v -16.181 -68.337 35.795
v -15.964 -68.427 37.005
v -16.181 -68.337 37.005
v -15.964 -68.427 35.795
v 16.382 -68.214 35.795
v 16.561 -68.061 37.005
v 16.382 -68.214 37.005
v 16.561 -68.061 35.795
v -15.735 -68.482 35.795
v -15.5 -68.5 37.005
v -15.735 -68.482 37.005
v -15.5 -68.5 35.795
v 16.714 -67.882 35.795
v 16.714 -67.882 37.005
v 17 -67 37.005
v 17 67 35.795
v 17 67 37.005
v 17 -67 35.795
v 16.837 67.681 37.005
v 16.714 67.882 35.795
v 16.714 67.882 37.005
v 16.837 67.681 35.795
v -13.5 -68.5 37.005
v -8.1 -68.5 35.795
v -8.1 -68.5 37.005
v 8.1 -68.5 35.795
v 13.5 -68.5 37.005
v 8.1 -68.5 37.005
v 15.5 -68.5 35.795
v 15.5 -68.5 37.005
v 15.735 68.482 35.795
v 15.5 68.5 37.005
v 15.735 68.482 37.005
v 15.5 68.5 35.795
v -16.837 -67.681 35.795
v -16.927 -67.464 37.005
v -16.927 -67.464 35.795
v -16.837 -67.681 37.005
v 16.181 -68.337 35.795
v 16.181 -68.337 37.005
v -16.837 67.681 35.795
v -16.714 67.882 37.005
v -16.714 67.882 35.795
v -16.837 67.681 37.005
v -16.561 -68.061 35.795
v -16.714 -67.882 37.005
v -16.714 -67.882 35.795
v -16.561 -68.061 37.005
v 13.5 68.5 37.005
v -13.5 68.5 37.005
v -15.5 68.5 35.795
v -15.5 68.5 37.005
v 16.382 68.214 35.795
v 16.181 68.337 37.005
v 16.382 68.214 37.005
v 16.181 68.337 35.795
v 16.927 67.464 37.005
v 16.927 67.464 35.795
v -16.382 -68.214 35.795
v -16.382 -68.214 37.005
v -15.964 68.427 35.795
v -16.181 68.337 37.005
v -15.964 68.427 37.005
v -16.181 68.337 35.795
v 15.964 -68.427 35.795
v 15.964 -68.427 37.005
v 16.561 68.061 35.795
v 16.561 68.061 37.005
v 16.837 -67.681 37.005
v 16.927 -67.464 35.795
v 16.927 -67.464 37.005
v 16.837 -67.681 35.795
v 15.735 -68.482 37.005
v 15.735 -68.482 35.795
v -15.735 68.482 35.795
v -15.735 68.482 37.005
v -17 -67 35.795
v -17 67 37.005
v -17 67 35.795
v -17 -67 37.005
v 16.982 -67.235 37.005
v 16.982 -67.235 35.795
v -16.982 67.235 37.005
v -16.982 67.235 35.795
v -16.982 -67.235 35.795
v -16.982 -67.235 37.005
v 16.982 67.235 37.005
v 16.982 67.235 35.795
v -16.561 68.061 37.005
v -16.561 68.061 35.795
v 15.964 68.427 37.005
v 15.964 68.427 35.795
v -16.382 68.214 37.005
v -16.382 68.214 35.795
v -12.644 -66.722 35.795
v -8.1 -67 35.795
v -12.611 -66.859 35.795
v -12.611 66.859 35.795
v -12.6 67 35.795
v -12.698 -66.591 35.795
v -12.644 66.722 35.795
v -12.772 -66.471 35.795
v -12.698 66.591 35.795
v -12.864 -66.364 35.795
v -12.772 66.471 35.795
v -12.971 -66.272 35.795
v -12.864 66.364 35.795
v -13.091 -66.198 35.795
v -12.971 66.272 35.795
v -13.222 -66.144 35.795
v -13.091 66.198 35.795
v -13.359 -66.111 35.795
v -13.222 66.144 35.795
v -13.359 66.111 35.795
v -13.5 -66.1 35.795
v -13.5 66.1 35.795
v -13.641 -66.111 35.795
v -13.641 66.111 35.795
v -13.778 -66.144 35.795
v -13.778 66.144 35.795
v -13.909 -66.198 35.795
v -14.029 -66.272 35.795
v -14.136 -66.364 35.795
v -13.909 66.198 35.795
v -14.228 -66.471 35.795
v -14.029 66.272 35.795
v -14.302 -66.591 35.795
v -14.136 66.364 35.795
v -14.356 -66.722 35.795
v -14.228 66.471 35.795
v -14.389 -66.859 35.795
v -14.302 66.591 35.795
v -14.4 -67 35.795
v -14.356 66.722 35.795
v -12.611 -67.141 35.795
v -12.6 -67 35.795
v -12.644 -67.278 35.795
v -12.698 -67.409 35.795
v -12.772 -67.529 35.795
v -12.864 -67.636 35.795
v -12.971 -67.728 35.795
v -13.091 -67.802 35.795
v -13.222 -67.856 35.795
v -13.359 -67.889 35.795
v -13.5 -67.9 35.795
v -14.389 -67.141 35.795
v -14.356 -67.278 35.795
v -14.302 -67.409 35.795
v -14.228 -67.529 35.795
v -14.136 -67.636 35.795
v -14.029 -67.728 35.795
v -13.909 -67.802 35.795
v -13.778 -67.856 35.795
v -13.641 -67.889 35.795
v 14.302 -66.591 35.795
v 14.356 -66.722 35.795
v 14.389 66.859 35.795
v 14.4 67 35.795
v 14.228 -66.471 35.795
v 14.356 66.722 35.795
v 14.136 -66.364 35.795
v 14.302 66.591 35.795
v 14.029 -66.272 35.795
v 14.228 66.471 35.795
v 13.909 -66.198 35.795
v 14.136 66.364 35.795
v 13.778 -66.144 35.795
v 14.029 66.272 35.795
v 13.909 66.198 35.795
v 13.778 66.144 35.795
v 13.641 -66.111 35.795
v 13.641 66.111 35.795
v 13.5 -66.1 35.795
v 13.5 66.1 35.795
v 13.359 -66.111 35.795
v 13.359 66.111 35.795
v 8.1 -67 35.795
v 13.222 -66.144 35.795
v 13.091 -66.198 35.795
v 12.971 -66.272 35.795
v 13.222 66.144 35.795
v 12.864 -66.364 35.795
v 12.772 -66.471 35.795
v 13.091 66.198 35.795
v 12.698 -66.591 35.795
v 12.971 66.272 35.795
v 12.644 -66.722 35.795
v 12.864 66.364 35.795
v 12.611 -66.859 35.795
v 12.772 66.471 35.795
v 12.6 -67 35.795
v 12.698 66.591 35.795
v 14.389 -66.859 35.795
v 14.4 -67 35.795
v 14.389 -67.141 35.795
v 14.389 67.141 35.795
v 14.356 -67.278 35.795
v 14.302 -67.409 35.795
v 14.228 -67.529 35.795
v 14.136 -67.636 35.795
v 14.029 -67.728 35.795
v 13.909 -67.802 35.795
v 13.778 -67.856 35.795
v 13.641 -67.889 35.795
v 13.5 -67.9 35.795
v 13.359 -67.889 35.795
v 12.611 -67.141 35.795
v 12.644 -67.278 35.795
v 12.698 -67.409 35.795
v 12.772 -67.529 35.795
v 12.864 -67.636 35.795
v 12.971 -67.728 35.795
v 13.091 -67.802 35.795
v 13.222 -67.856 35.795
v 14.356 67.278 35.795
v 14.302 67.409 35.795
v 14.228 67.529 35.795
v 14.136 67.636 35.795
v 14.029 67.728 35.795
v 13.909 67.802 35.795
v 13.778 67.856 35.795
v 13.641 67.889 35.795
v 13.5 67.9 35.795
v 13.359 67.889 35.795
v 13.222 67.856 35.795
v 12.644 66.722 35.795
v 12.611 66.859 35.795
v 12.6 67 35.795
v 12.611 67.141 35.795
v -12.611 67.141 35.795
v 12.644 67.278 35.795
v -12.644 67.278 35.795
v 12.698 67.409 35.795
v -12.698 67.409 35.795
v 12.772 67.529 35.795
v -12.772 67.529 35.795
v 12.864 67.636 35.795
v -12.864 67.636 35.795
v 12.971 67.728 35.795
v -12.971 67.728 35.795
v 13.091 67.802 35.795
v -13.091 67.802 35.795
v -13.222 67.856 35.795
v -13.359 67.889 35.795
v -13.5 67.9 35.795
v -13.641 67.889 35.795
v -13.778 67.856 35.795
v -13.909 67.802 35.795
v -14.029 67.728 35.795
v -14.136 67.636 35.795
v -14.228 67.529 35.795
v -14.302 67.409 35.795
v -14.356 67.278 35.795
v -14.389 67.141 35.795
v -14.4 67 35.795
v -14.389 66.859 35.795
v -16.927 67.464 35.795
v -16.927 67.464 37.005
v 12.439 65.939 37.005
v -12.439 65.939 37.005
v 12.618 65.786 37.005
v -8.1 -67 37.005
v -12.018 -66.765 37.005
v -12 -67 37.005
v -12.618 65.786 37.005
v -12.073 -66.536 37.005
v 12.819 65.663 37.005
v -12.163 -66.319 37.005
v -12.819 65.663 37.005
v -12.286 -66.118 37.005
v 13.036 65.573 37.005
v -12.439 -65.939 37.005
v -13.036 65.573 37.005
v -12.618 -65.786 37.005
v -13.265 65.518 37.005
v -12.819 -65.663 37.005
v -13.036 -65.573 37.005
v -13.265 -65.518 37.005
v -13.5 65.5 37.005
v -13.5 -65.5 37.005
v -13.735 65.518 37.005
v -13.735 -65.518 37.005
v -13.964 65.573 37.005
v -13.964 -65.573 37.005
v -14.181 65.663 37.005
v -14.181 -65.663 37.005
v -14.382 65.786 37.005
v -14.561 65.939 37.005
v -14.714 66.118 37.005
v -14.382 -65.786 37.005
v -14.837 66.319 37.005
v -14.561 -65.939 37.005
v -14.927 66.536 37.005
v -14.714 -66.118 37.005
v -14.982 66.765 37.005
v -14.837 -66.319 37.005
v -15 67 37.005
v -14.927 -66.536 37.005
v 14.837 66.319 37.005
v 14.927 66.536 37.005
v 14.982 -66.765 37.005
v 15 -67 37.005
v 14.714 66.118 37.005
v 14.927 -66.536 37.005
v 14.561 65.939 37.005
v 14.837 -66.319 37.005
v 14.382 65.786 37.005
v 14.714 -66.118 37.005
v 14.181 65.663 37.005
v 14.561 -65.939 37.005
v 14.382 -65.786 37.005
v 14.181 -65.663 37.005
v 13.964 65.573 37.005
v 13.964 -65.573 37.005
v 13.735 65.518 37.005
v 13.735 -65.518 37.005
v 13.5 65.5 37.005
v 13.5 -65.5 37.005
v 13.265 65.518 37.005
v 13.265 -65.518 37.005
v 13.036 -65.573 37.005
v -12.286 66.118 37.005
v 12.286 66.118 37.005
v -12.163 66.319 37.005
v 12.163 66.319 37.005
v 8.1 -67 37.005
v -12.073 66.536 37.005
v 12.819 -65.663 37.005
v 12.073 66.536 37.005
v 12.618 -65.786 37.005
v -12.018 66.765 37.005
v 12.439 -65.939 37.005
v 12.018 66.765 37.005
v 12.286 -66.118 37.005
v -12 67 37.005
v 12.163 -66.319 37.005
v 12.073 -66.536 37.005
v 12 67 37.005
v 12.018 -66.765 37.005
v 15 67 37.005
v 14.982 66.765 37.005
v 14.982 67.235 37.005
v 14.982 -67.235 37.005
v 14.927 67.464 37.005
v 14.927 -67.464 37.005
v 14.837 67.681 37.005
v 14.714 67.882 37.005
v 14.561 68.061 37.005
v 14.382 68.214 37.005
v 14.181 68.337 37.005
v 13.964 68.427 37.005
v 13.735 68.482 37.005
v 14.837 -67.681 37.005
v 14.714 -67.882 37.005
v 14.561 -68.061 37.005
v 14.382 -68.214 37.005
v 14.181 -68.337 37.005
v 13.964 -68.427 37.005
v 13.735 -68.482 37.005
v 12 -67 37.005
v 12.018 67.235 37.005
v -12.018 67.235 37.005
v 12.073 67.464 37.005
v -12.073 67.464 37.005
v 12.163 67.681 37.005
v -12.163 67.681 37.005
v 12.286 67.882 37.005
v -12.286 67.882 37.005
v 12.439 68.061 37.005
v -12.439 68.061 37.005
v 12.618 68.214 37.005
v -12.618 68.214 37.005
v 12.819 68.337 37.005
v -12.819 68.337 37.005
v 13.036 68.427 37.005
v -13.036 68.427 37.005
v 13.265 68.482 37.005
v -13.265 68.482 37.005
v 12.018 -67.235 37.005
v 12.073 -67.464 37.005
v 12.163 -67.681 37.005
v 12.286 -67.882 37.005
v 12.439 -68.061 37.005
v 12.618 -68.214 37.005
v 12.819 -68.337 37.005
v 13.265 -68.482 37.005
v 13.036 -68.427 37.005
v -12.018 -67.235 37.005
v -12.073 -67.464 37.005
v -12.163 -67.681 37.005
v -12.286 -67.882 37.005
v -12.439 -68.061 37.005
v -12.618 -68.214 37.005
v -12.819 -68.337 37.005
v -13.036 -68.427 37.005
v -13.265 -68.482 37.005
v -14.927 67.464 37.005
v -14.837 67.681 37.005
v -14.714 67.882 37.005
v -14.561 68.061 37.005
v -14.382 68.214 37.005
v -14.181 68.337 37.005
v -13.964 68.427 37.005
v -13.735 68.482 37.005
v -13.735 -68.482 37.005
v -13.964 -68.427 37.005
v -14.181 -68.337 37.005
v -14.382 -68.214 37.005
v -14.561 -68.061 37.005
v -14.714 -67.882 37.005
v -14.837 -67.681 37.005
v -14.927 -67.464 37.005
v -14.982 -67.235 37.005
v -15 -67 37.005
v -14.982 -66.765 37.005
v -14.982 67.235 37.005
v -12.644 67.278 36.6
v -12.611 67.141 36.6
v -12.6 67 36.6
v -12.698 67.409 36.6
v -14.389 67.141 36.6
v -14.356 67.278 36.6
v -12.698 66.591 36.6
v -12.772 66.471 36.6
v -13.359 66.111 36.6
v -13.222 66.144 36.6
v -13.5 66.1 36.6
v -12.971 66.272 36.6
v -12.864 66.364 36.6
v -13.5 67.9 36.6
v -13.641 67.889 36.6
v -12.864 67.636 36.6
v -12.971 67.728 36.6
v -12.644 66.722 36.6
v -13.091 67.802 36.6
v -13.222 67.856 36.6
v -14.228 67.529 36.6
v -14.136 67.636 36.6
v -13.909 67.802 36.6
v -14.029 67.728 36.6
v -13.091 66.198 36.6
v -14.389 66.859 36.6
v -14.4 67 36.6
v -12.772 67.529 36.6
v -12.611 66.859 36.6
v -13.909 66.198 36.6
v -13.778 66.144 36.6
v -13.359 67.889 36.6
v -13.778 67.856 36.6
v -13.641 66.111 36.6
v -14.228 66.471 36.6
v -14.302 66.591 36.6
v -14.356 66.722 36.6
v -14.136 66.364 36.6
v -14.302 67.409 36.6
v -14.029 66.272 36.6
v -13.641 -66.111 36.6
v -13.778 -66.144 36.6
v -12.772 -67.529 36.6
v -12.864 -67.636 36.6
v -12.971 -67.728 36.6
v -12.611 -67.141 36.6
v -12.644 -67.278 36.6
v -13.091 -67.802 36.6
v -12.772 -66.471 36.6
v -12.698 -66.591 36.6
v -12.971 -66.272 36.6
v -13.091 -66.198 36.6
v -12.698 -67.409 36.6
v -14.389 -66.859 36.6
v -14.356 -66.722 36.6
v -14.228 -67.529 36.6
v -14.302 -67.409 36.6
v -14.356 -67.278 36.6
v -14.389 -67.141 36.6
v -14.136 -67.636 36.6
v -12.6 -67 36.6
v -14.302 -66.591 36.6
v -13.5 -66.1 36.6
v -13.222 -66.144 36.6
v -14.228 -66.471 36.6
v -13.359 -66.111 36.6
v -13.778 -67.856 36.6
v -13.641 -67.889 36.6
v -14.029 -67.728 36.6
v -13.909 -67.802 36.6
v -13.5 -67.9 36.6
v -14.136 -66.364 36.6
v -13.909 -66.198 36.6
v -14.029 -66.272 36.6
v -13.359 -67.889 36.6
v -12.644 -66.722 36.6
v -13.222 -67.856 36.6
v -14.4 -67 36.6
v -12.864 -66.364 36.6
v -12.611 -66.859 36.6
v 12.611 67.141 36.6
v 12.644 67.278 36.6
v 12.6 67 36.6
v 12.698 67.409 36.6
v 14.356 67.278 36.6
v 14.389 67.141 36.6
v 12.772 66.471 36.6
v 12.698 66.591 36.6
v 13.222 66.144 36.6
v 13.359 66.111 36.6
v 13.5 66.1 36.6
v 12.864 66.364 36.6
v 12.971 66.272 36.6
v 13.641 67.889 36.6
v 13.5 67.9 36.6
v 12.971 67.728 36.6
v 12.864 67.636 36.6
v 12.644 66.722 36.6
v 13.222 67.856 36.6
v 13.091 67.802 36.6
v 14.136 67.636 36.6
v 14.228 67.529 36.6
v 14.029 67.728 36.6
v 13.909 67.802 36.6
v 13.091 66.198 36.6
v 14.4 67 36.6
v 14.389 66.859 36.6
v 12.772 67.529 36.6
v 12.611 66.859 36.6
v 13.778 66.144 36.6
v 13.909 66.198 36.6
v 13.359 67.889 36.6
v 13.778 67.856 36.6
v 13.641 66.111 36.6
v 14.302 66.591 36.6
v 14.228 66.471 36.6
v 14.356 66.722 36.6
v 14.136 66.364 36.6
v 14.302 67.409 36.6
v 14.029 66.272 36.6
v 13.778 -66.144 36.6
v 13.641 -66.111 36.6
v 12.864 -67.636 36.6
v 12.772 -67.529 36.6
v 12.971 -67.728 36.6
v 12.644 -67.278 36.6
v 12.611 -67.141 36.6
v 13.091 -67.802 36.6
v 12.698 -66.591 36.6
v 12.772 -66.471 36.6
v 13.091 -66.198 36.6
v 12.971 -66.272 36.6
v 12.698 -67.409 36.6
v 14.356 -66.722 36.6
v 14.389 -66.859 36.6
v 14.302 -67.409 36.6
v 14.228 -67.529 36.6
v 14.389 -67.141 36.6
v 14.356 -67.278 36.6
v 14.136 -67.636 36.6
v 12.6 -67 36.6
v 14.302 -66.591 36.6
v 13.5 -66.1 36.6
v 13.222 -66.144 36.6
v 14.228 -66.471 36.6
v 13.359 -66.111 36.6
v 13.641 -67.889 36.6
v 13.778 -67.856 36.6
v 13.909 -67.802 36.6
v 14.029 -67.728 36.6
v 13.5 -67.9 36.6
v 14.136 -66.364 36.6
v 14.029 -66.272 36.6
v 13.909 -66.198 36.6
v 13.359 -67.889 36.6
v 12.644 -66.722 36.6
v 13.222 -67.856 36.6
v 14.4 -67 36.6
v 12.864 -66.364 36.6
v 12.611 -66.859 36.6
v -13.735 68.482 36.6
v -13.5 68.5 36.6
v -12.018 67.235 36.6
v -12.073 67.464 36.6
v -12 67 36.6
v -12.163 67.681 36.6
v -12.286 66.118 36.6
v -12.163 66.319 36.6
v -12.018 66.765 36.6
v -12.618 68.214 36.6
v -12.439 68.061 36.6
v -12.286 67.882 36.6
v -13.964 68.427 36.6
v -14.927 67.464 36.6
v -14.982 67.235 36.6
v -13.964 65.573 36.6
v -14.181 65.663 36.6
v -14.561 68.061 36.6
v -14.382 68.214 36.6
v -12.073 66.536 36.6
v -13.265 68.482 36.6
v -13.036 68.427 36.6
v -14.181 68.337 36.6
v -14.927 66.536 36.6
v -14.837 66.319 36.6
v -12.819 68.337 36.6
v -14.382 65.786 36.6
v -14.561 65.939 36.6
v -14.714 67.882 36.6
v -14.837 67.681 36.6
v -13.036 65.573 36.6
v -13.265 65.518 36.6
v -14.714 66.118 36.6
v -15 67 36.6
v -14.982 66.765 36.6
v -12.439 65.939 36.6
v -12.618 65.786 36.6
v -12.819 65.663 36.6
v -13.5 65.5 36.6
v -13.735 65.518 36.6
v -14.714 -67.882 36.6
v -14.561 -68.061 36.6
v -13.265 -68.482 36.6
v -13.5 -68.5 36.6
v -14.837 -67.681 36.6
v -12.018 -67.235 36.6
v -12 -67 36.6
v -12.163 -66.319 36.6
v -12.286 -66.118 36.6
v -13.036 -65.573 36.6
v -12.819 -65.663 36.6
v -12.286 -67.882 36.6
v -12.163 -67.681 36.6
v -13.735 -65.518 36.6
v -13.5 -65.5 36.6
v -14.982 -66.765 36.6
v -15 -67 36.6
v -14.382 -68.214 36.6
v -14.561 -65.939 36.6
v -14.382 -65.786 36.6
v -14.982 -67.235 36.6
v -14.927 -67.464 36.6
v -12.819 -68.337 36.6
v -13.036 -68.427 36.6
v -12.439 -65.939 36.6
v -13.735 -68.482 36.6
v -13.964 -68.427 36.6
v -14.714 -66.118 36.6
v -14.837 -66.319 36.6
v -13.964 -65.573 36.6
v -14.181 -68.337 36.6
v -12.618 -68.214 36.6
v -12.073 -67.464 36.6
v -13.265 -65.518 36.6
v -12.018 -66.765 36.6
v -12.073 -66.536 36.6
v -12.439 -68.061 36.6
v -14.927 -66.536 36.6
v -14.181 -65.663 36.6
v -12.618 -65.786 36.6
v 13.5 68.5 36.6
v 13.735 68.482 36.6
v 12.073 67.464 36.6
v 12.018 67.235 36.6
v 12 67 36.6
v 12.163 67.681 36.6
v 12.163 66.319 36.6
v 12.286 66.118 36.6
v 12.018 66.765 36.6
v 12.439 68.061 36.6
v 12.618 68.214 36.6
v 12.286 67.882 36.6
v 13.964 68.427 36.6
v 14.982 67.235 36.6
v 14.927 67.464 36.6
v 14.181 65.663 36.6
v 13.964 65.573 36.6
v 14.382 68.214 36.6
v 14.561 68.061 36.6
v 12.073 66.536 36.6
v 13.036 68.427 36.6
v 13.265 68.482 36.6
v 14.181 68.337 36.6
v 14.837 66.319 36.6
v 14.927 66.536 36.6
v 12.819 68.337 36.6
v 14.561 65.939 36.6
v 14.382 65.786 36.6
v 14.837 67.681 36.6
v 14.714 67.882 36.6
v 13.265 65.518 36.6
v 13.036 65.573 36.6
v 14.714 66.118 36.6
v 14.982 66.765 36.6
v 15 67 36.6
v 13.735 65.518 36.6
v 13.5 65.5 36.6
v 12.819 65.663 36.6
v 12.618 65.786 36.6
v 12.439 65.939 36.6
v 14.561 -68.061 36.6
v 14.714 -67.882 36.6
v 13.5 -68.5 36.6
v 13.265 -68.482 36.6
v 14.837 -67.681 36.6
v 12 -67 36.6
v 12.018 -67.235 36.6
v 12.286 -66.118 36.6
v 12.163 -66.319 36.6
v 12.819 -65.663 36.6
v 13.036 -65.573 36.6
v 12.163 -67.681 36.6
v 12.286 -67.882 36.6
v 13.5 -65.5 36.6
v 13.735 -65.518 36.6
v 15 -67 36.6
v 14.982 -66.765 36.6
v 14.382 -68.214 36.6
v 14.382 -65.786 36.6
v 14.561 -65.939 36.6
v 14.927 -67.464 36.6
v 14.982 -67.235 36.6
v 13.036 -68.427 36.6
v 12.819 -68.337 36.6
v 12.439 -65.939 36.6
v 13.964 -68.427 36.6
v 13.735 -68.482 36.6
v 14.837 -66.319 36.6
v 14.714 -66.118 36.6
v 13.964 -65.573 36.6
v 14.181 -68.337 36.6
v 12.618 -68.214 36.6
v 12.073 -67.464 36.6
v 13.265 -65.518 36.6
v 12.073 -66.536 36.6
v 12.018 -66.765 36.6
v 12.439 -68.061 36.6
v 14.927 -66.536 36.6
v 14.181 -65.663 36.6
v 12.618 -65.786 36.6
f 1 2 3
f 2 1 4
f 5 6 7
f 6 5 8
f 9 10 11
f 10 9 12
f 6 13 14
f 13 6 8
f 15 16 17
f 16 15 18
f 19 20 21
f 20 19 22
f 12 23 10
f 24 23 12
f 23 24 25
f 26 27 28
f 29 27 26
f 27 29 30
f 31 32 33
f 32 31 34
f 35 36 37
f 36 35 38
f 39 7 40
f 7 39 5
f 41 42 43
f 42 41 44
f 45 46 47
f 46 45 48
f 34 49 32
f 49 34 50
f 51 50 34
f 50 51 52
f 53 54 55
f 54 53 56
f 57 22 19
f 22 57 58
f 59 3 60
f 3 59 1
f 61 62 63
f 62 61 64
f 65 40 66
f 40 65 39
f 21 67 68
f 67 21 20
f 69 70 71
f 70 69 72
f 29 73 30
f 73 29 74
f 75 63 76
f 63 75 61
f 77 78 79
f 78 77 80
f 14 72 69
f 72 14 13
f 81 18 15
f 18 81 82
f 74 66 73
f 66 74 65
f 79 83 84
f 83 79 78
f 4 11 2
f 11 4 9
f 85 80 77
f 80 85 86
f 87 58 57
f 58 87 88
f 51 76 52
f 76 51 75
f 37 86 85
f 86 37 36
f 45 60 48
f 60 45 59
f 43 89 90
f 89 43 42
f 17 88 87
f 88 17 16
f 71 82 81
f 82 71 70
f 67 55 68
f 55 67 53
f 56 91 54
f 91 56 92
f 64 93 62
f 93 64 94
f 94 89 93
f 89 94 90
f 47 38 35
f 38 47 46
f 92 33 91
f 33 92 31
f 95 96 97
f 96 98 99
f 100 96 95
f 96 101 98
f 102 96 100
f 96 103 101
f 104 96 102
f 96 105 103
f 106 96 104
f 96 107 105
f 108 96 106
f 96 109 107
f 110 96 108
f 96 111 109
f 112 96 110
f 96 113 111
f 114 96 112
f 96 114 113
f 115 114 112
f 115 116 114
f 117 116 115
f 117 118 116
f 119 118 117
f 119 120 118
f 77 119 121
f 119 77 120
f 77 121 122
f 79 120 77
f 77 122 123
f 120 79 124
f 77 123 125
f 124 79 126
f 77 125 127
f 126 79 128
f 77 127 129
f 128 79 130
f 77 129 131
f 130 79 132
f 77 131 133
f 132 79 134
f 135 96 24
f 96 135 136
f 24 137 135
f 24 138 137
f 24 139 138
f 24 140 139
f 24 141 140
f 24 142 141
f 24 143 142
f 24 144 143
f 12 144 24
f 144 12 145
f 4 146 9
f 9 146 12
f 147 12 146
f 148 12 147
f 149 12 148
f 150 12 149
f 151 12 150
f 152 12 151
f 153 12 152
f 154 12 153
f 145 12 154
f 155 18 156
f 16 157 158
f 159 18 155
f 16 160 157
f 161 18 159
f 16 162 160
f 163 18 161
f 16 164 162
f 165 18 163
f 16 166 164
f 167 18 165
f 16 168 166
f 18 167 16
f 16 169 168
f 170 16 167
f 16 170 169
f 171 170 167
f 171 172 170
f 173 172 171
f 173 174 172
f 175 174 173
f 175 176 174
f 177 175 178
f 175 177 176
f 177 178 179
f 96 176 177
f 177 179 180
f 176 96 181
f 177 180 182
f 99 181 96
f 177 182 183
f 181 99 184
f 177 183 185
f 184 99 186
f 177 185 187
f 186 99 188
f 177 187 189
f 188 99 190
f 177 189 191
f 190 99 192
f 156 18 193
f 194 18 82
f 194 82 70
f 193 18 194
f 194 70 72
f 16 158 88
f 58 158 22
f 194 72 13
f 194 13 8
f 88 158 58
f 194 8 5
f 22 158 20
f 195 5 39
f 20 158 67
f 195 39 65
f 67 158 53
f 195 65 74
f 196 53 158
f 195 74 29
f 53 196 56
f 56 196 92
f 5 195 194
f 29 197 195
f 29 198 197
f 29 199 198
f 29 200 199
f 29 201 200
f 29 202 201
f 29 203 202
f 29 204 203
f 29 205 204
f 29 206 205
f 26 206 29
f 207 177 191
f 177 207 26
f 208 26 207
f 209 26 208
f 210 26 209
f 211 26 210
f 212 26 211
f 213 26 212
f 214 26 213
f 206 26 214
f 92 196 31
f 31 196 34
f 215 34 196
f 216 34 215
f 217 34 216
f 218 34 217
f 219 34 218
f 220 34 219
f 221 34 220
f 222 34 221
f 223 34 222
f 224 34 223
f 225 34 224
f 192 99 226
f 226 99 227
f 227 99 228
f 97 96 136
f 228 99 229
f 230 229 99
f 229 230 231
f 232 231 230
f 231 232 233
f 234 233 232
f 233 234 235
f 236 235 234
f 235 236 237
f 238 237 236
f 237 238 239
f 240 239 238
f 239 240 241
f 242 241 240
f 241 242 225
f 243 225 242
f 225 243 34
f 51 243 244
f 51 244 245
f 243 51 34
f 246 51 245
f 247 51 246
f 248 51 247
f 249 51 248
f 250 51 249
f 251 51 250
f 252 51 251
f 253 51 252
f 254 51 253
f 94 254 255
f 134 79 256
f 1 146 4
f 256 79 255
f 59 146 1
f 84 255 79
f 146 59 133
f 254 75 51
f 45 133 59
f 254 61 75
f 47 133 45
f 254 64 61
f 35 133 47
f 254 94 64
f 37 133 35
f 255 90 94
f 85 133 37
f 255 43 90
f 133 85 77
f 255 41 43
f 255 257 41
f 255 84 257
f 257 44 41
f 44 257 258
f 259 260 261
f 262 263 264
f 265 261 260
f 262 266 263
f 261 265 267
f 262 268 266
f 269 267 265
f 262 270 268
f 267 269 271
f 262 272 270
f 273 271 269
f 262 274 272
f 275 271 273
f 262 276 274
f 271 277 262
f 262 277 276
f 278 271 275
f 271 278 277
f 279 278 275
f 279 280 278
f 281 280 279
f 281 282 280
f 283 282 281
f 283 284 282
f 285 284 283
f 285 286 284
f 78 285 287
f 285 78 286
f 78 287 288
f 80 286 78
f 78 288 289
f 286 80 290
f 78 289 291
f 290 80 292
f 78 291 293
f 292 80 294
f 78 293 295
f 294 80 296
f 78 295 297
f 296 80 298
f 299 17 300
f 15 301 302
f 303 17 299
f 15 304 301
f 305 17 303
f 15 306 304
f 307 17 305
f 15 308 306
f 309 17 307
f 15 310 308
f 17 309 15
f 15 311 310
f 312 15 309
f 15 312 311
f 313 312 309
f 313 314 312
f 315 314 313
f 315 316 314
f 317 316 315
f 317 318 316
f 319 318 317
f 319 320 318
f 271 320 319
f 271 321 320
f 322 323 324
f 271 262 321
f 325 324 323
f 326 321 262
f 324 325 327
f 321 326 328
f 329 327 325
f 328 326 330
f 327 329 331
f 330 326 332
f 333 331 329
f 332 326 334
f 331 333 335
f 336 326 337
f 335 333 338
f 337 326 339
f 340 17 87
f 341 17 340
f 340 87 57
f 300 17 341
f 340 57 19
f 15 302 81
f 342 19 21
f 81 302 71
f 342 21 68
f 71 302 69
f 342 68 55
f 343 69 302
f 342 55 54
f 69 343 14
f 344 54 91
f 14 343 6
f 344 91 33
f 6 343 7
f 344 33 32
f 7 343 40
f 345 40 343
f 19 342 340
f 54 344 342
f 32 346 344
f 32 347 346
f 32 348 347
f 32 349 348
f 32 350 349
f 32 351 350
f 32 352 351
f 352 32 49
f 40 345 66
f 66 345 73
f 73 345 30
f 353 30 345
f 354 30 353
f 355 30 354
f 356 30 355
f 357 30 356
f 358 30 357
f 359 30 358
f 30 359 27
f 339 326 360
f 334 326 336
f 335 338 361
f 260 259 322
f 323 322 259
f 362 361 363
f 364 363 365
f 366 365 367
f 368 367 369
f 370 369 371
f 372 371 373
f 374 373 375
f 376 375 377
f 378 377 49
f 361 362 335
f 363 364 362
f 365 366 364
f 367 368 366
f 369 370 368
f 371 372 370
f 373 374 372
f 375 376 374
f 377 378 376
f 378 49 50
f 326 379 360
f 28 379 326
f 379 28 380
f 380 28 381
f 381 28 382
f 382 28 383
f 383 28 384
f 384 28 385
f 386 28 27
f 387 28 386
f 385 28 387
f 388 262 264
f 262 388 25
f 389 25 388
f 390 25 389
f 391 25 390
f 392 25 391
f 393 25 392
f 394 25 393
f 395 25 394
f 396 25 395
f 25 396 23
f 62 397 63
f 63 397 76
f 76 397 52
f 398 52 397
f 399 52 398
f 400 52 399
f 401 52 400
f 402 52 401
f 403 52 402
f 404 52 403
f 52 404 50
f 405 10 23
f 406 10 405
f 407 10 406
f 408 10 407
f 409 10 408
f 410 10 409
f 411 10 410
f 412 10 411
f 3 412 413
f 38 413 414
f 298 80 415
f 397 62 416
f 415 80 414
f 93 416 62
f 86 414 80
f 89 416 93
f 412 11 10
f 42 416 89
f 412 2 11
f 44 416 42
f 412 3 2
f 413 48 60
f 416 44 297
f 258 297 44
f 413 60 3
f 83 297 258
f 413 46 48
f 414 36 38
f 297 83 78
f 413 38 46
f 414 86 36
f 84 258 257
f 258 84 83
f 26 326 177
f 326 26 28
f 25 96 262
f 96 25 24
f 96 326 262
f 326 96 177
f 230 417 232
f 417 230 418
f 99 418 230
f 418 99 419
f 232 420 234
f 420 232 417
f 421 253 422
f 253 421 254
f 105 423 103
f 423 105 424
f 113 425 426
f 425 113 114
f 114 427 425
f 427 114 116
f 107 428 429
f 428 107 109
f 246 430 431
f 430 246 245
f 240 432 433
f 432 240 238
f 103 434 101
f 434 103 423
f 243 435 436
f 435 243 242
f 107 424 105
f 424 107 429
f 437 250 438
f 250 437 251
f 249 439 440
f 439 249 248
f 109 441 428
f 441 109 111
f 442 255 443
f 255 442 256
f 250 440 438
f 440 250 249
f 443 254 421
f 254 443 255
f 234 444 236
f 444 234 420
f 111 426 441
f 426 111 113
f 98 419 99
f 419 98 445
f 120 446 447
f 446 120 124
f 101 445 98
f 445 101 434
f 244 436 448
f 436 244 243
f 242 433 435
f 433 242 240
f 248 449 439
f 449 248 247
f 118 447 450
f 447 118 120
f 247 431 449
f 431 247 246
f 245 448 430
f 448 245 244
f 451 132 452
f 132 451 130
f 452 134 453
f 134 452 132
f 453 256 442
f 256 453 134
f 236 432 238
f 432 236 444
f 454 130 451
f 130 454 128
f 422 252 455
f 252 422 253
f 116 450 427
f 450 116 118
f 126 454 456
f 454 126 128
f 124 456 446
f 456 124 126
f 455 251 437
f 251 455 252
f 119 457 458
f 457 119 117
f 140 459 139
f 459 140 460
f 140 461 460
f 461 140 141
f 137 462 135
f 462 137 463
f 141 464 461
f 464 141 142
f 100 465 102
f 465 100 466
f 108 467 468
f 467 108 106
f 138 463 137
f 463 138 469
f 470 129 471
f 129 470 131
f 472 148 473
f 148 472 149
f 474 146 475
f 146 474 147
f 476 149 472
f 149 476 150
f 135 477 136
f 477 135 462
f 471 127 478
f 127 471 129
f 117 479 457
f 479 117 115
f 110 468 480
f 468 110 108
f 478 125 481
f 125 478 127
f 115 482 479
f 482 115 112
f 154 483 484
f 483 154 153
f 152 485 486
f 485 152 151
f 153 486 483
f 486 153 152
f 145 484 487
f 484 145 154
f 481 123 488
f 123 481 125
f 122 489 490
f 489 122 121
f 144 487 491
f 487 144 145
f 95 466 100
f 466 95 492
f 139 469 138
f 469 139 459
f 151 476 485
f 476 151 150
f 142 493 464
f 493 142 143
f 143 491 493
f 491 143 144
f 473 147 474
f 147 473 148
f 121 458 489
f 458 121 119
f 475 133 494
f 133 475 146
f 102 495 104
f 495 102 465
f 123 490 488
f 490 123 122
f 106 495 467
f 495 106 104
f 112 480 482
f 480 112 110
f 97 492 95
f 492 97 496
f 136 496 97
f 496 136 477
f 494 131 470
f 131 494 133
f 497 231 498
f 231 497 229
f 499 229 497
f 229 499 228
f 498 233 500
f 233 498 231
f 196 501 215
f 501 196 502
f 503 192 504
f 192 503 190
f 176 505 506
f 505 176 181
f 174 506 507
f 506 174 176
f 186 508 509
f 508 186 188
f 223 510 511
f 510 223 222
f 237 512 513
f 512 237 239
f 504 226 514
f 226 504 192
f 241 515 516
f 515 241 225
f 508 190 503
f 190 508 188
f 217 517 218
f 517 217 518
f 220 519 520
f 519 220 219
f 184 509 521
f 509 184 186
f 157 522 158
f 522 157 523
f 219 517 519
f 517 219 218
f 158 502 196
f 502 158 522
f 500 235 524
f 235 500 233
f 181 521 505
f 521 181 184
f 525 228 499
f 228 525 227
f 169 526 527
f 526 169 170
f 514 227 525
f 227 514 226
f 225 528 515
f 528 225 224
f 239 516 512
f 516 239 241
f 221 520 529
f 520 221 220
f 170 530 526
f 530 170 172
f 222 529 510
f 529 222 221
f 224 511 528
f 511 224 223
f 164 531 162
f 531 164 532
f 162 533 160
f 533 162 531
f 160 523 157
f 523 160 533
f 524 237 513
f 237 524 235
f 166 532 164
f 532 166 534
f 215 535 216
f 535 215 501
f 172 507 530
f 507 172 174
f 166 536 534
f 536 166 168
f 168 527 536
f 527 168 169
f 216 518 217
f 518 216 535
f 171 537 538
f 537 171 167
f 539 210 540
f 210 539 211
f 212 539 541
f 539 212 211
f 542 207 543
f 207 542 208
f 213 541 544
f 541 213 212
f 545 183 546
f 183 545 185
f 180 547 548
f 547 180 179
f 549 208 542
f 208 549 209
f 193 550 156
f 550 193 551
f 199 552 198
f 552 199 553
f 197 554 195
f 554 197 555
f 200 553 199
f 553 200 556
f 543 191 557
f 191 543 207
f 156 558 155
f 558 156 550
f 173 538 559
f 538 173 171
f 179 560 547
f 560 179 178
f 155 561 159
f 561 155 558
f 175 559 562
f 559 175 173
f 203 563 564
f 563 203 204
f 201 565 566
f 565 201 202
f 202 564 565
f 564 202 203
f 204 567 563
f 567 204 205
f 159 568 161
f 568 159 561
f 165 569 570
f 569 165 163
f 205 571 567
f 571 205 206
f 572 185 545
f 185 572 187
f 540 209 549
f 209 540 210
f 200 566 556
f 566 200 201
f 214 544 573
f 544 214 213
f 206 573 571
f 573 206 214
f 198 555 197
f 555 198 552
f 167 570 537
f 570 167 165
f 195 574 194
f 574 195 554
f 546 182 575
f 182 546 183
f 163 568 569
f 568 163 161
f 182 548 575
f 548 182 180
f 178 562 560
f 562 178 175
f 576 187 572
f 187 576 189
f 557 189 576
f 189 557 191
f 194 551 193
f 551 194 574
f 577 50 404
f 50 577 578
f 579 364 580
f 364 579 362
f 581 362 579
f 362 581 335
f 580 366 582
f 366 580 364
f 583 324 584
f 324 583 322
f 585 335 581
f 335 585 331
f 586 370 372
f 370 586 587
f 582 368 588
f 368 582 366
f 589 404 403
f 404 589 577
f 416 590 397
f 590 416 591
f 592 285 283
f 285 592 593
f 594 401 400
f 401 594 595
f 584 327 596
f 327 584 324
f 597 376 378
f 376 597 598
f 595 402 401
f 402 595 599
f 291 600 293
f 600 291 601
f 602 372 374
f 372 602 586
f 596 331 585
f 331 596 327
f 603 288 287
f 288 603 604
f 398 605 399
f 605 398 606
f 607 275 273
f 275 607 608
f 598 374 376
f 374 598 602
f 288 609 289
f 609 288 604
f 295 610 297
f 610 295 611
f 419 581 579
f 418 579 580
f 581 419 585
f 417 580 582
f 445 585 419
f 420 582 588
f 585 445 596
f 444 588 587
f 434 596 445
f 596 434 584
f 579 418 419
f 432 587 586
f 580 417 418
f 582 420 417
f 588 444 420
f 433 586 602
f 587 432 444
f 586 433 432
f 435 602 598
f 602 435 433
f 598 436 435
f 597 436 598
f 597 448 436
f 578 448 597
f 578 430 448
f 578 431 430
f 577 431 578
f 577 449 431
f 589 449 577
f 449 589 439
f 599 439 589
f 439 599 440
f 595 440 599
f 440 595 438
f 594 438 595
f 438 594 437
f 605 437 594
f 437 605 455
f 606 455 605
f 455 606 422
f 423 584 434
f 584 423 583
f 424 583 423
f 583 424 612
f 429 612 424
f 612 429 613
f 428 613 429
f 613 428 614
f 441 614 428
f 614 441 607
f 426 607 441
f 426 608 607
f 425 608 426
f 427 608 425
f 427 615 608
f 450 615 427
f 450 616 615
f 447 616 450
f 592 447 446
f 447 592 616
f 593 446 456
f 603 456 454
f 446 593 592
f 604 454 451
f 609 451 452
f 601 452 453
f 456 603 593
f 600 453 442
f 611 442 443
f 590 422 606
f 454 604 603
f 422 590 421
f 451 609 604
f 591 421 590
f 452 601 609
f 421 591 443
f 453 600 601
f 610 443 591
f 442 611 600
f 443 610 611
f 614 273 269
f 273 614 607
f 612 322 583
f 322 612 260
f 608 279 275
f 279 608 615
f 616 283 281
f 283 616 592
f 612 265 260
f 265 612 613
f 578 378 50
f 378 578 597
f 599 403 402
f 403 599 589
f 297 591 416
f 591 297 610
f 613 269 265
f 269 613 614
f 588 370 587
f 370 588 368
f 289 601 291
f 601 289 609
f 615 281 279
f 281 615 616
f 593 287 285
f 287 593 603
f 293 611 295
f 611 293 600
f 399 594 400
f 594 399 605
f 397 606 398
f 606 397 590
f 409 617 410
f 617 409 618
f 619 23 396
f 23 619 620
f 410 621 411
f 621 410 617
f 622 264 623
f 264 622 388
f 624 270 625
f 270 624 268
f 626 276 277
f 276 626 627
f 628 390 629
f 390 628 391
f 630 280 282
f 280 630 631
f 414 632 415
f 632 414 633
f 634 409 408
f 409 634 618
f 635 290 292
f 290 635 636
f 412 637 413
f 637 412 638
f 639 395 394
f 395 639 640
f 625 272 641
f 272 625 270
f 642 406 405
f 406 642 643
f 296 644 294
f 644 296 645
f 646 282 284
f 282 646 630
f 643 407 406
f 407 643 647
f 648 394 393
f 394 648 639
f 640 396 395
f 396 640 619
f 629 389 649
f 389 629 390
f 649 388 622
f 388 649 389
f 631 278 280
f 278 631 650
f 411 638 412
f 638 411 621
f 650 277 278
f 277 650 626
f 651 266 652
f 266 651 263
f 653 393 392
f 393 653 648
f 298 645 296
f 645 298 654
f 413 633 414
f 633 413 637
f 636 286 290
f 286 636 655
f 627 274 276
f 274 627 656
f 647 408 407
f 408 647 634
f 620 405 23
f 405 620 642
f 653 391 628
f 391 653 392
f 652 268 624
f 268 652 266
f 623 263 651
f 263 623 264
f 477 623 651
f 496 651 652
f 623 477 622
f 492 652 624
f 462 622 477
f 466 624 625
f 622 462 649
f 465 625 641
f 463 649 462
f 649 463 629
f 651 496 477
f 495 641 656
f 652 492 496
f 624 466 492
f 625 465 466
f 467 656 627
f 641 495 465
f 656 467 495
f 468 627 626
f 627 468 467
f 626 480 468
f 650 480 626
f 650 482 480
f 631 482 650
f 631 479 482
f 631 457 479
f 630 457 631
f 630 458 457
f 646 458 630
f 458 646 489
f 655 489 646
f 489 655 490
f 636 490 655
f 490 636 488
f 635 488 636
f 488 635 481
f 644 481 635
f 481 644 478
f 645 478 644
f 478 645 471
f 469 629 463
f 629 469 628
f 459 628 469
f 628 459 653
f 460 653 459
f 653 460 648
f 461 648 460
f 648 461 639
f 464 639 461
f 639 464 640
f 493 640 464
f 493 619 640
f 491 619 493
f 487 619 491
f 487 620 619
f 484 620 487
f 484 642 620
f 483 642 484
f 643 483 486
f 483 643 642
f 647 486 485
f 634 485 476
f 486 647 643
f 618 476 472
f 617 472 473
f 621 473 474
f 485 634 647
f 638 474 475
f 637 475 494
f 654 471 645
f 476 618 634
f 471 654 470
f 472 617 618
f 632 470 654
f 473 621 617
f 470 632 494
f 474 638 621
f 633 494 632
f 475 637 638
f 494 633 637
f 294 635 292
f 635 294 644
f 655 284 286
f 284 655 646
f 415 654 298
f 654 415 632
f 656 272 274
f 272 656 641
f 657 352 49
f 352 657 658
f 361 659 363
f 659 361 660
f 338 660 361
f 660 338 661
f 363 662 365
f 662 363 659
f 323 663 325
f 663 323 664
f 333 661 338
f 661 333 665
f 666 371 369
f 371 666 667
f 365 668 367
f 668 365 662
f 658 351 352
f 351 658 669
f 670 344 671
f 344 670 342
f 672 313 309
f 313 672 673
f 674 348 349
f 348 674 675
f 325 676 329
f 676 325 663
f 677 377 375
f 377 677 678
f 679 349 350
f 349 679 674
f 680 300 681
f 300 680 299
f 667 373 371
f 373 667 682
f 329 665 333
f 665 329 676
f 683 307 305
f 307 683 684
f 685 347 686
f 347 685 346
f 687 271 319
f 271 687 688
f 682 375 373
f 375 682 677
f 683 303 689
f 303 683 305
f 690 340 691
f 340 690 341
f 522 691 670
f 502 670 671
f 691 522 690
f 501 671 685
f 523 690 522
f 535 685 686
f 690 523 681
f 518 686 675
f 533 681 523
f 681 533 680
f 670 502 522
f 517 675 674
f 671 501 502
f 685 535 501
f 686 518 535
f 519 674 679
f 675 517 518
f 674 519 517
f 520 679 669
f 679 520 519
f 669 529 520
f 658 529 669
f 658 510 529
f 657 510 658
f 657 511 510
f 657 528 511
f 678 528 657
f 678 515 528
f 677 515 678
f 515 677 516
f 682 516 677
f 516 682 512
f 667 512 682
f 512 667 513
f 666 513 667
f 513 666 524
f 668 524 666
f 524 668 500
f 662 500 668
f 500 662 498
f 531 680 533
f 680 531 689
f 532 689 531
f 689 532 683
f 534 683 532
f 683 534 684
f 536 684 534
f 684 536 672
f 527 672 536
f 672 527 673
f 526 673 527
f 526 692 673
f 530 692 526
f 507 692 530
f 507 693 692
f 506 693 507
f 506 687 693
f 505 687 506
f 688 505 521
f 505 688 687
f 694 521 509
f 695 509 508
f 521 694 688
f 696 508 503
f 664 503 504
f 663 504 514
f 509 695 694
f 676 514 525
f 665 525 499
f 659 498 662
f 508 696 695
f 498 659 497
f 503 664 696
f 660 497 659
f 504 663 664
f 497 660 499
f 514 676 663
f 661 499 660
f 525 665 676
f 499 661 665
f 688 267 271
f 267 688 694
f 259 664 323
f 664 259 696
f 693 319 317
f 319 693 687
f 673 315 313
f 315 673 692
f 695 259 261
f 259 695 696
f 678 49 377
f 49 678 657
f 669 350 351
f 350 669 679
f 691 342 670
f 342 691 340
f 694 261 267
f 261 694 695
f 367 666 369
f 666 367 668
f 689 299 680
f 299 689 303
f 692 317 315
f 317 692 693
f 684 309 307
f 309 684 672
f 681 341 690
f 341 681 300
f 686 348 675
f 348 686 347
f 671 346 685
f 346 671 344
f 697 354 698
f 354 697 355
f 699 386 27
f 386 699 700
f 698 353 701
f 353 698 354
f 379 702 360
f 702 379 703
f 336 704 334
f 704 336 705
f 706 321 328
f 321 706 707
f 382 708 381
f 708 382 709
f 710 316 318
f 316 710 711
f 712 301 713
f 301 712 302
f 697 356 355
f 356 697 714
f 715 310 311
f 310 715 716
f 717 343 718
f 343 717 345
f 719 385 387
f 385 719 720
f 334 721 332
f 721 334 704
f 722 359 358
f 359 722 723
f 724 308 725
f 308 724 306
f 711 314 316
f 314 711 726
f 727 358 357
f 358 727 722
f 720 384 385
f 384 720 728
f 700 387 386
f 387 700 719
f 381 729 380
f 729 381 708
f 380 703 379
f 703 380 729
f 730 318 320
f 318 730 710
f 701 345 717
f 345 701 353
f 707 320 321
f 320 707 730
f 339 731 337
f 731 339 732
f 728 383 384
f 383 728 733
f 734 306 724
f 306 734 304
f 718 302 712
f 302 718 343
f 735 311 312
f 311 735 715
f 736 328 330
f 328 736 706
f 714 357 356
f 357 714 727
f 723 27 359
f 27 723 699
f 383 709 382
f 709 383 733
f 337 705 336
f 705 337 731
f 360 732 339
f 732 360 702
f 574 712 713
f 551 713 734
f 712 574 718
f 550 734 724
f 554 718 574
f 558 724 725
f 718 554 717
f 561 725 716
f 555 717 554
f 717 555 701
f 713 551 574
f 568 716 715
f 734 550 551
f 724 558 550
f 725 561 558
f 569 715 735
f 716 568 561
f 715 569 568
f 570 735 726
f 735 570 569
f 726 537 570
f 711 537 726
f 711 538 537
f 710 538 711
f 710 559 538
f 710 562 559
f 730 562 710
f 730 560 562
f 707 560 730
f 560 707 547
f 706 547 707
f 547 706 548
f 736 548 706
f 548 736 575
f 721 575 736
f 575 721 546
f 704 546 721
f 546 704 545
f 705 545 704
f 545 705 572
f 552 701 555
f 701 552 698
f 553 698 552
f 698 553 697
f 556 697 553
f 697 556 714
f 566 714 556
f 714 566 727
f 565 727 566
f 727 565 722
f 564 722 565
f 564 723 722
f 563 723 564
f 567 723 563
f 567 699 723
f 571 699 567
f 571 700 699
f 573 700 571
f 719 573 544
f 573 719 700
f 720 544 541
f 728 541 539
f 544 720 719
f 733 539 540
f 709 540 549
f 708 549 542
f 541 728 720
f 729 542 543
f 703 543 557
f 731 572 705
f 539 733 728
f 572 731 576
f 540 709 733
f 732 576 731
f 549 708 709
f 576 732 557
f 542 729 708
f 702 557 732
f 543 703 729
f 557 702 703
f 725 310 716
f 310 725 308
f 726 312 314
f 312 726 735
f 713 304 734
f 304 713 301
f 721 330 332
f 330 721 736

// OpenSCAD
// file: charging_board_typec.scad
USB_TYPEC_BOARD_X = 17.1;
USB_TYPEC_BOARD_Y = 28.1;
USB_TYPEC_BOARD_Z = 1.0;

module USB_TYPEC_BOARD(diff=false) {
  translate([0, -USB_TYPEC_BOARD_Y/2, 0])   
  linear_extrude(height=USB_TYPEC_BOARD_Z, center=!true, convexity=10, twist=0) 
  square(size=[USB_TYPEC_BOARD_X, USB_TYPEC_BOARD_Y], center=true);

  translate([0, 1.5, USB_TYPEC_BOARD_Z])
  translate([0, -7.3, 3/2])
  rotate([-90, 0, 0]) 
  linear_extrude(height=diff ? 20 : 7.3, center=!true, convexity=10, twist=0)
  hull(){
    offset(r= diff ? 0.3 : 0)
    mirror_x()
    translate([9/2-3/2, 0, 0])
    circle(d=3);
  }
}
// file: scad-utils/mirror.scad
// Copyright (c) 2013 Oskar Linde. All rights reserved.
// License: BSD
//
// This library contains simple mirroring functions
//
// mirror_x()
// mirror_y()
// mirror_z()


module mirror_x() {
  union() {
    child();
    scale([-1,1,1]) child();
  }
}

module mirror_y() {
  union() {
    child();
    scale([1,-1,1]) child();
  }
}

module mirror_z() {
  union() {
    child();
    scale([1,1,-1]) child();
  }
}
// file: scad-utils/morphology.scad
// Copyright (c) 2013 Oskar Linde. All rights reserved.
// License: BSD
//
// This library contains basic 2D morphology operations
//
// outset(d=1)            - creates a polygon at an offset d outside a 2D shape
// inset(d=1)             - creates a polygon at an offset d inside a 2D shape
// fillet(r=1)            - adds fillets of radius r to all concave corners of a 2D shape
// rounding(r=1)          - adds rounding to all convex corners of a 2D shape
// shell(d,center=false)  - makes a shell of width d along the edge of a 2D shape
//                        - positive values of d places the shell on the outside
//                        - negative values of d places the shell on the inside
//                        - center=true and positive d places the shell centered on the edge

module outset(d=1) {
	// Bug workaround for older OpenSCAD versions
	if (version_num() < 20130424) render() outset_extruded(d) children();
	else minkowski() {
		circle(r=d);
		children();
	}
}

module outset_extruded(d=1) {
   projection(cut=true) minkowski() {
        cylinder(r=d);
        linear_extrude(center=true) children();
   }
}

module inset(d=1) {
	 render() inverse() outset(d=d) inverse() children();
}

module fillet(r=1) {
	inset(d=r) render() outset(d=r) children();
}

module rounding(r=1) {
	outset(d=r) inset(d=r) children();
}

module shell(d,center=false) {
	if (center && d > 0) {
		difference() {
			outset(d=d/2) children();
			inset(d=d/2) children();
		}
	}
	if (!center && d > 0) {
		difference() {
			outset(d=d) children();
			children();
		}
	}
	if (!center && d < 0) {
		difference() {
			children();
			inset(d=-d) children();
		}
	}
	if (d == 0) children();
}


// Below are for internal use only

module inverse() {
	difference() {
		square(1e5,center=true);
		children();
	}
}


// TEST CODE

use <mirror.scad>

module arrow(l=1,w=.6,t=0.15) {
	mirror_y() polygon([[0,0],[l,0],[l-w/2,w/2],[l-w/2-sqrt(2)*t,w/2],[l-t/2-sqrt(2)*t,t/2],[0,t/2]]);
}

module shape() {
	polygon([[0,0],[1,0],[1.5,1],[2.5,1],[2,-1],[0,-1]]);
}

if(0) assign($fn=32) {

	for (p = [0:10*3-1]) assign(o=floor(p/3)) {
		translate([(p%3)*2.5,-o*3]) {
			//%if (p % 3 == 1) translate([0,0,1]) shape();
			if (p % 3 == 0) shape();
			if (p % 3 == 1) translate([0.6,0]) arrow();
			if (p % 3 == 2) {
				if (o == 0) inset(d=0.3) shape();
				if (o == 1) outset(d=0.3) shape();
				if (o == 2) rounding(r=0.3) shape();
				if (o == 3) fillet(r=0.3) shape();
				if (o == 4) shell(d=0.3) shape();
				if (o == 5) shell(d=-0.3) shape();
				if (o == 6) shell(d=0.3,center=true) shape();
				if (o == 7) rounding(r=0.3) fillet(r=0.3) shape();
				if (o == 8) shell(d=0.3,center=true) fillet(r=0.3) rounding(r=0.3) shape();
				if (o == 9) shell(d=-0.3) fillet(r=0.3) rounding(r=0.3) shape();
			}
		}
	}
}
// file: minidenko-case-base.scad
$fn=40;

include <scad-utils/morphology.scad>
include <scad-utils/mirror.scad>

// include <charging_board_microb.scad>
include <charging_board_typec.scad>

LED_X=32;
LED_Y=130;
LED_Z=13.0;

BODY_X=LED_X+5;
BODY_Y=LED_Y+10;
// BODY_BOTTOM_Z = 1.4;
BODY_BOTTOM_Z = 0.3;
BODY_Z=LED_Z+11+0.8*2 + BODY_BOTTOM_Z;

STAND_X=3;

BACKPANEL_Z=1.2;

// LED Matrix
*%translate([0, 0, LED_Z/2 + BODY_BOTTOM_Z])
color("red")
cube(size=[LED_X, LED_Y, LED_Z], center=true);

module body(){
  difference(){
    linear_extrude(height=BODY_Z, center=!true, convexity=10, twist=0)
    rounding(r=3)
    square(size=[BODY_X, BODY_Y], center=true);

    // inner space
    translate([0, 0, (BODY_Z)/2 + BODY_BOTTOM_Z]) 
    cube(size=[LED_X + 1, LED_Y + 1, BODY_Z], center=true);

    // edge();
    // USB
    translate([0, LED_Y/2, LED_Z + BODY_BOTTOM_Z + 0.8]) {
      USB_TYPEC_BOARD(diff=true);
      // USB PLUG
      translate([0, 1.5, 0])
      translate([0, 0, 5/2])  
      rotate([-90, 0, 0]) 
      linear_extrude(height=10, center=!true, convexity=10, twist=0)
      hull(){
        mirror_x()
        translate([4, 0, 0])
        circle(d=7);
      }
    }

    // sw
    translate([0, -BODY_Y/2+3, LED_Z + BODY_BOTTOM_Z +  12/2 + 0.8 * 2]) {
      translate([0, 15/2, 0])
      cube(size=[14, 15, 12], center=true);

      translate([0, -5/2, 0]) 
      cube(size=[15.2+1, 5, 12], center=true);
    }


  }
  // stand
  mirror_y()
  translate([0, BODY_Y/4, 3]) 
  translate([-BODY_X/2, 0, 0]) 
  difference(){
    linear_extrude(height=6, center=!true, convexity=10, twist=0)
    difference(){
      rounding(r=2)
      square(size=[STAND_X*2, 10], center=true);

      translate([STAND_X/2, 0, 0]) 
      square(size=[STAND_X, 10], center=true);
    }
    translate([-7*cos(50), 0, 0]) 
    rotate([0, 50, 0]) 
    cube(size=[7, 10, 7], center=true);

  }

}

// screws
module screws(d=1.4) {
  mirror_x()
  mirror_y()
  translate([-(BODY_X/2 - 5), BODY_Y/2 - 3, BODY_Z-9])
  cylinder(d=d, h=10, center=!true);
}


module backPanel(inset=0, h=1.2) {
  difference(){
    translate([0, 0, BODY_Z]) 
    hull() {
      linear_extrude(height=0.01, center=true, convexity=10, twist=0)
      inset(d=1+inset)
      rounding(r=3)
      square(size=[BODY_X, BODY_Y], center=true);

      translate([0, 0, -h]) 
      linear_extrude(height=0.01, center=true, convexity=10, twist=0)
      inset(d=1+inset)
      rounding(r=3)
      square(size=[BODY_X, BODY_Y], center=true);  
    }

    // power switch
    translate([0, -BODY_Y/2+3, LED_Z + BODY_BOTTOM_Z +  12/2 + 0.8]) {
      translate([0, -5/2, 0]) 
      cube(size=[15.2+1, 5, 12], center=true);
    }
  }
}
// main file
$fn=40;

include <minidenko-case-base.scad>

BODY_BOTTOM_Z = 1.4;

translate([0, 0, 10]) 
difference(){
  backPanel(inset=0.5, h=1.2);
  screws(1.8);
  translate([0, 0, 9-0.4])
  screws(3);

  translate([-15, -2, BODY_Z-0.6]) 
  linear_extrude(height=1, center=false, convexity=10, twist=0)
  rotate([0, 0, -90])
  resize([55, 0, 0], auto=true)
  import("minidenko-logo-mono.dxf");
}
